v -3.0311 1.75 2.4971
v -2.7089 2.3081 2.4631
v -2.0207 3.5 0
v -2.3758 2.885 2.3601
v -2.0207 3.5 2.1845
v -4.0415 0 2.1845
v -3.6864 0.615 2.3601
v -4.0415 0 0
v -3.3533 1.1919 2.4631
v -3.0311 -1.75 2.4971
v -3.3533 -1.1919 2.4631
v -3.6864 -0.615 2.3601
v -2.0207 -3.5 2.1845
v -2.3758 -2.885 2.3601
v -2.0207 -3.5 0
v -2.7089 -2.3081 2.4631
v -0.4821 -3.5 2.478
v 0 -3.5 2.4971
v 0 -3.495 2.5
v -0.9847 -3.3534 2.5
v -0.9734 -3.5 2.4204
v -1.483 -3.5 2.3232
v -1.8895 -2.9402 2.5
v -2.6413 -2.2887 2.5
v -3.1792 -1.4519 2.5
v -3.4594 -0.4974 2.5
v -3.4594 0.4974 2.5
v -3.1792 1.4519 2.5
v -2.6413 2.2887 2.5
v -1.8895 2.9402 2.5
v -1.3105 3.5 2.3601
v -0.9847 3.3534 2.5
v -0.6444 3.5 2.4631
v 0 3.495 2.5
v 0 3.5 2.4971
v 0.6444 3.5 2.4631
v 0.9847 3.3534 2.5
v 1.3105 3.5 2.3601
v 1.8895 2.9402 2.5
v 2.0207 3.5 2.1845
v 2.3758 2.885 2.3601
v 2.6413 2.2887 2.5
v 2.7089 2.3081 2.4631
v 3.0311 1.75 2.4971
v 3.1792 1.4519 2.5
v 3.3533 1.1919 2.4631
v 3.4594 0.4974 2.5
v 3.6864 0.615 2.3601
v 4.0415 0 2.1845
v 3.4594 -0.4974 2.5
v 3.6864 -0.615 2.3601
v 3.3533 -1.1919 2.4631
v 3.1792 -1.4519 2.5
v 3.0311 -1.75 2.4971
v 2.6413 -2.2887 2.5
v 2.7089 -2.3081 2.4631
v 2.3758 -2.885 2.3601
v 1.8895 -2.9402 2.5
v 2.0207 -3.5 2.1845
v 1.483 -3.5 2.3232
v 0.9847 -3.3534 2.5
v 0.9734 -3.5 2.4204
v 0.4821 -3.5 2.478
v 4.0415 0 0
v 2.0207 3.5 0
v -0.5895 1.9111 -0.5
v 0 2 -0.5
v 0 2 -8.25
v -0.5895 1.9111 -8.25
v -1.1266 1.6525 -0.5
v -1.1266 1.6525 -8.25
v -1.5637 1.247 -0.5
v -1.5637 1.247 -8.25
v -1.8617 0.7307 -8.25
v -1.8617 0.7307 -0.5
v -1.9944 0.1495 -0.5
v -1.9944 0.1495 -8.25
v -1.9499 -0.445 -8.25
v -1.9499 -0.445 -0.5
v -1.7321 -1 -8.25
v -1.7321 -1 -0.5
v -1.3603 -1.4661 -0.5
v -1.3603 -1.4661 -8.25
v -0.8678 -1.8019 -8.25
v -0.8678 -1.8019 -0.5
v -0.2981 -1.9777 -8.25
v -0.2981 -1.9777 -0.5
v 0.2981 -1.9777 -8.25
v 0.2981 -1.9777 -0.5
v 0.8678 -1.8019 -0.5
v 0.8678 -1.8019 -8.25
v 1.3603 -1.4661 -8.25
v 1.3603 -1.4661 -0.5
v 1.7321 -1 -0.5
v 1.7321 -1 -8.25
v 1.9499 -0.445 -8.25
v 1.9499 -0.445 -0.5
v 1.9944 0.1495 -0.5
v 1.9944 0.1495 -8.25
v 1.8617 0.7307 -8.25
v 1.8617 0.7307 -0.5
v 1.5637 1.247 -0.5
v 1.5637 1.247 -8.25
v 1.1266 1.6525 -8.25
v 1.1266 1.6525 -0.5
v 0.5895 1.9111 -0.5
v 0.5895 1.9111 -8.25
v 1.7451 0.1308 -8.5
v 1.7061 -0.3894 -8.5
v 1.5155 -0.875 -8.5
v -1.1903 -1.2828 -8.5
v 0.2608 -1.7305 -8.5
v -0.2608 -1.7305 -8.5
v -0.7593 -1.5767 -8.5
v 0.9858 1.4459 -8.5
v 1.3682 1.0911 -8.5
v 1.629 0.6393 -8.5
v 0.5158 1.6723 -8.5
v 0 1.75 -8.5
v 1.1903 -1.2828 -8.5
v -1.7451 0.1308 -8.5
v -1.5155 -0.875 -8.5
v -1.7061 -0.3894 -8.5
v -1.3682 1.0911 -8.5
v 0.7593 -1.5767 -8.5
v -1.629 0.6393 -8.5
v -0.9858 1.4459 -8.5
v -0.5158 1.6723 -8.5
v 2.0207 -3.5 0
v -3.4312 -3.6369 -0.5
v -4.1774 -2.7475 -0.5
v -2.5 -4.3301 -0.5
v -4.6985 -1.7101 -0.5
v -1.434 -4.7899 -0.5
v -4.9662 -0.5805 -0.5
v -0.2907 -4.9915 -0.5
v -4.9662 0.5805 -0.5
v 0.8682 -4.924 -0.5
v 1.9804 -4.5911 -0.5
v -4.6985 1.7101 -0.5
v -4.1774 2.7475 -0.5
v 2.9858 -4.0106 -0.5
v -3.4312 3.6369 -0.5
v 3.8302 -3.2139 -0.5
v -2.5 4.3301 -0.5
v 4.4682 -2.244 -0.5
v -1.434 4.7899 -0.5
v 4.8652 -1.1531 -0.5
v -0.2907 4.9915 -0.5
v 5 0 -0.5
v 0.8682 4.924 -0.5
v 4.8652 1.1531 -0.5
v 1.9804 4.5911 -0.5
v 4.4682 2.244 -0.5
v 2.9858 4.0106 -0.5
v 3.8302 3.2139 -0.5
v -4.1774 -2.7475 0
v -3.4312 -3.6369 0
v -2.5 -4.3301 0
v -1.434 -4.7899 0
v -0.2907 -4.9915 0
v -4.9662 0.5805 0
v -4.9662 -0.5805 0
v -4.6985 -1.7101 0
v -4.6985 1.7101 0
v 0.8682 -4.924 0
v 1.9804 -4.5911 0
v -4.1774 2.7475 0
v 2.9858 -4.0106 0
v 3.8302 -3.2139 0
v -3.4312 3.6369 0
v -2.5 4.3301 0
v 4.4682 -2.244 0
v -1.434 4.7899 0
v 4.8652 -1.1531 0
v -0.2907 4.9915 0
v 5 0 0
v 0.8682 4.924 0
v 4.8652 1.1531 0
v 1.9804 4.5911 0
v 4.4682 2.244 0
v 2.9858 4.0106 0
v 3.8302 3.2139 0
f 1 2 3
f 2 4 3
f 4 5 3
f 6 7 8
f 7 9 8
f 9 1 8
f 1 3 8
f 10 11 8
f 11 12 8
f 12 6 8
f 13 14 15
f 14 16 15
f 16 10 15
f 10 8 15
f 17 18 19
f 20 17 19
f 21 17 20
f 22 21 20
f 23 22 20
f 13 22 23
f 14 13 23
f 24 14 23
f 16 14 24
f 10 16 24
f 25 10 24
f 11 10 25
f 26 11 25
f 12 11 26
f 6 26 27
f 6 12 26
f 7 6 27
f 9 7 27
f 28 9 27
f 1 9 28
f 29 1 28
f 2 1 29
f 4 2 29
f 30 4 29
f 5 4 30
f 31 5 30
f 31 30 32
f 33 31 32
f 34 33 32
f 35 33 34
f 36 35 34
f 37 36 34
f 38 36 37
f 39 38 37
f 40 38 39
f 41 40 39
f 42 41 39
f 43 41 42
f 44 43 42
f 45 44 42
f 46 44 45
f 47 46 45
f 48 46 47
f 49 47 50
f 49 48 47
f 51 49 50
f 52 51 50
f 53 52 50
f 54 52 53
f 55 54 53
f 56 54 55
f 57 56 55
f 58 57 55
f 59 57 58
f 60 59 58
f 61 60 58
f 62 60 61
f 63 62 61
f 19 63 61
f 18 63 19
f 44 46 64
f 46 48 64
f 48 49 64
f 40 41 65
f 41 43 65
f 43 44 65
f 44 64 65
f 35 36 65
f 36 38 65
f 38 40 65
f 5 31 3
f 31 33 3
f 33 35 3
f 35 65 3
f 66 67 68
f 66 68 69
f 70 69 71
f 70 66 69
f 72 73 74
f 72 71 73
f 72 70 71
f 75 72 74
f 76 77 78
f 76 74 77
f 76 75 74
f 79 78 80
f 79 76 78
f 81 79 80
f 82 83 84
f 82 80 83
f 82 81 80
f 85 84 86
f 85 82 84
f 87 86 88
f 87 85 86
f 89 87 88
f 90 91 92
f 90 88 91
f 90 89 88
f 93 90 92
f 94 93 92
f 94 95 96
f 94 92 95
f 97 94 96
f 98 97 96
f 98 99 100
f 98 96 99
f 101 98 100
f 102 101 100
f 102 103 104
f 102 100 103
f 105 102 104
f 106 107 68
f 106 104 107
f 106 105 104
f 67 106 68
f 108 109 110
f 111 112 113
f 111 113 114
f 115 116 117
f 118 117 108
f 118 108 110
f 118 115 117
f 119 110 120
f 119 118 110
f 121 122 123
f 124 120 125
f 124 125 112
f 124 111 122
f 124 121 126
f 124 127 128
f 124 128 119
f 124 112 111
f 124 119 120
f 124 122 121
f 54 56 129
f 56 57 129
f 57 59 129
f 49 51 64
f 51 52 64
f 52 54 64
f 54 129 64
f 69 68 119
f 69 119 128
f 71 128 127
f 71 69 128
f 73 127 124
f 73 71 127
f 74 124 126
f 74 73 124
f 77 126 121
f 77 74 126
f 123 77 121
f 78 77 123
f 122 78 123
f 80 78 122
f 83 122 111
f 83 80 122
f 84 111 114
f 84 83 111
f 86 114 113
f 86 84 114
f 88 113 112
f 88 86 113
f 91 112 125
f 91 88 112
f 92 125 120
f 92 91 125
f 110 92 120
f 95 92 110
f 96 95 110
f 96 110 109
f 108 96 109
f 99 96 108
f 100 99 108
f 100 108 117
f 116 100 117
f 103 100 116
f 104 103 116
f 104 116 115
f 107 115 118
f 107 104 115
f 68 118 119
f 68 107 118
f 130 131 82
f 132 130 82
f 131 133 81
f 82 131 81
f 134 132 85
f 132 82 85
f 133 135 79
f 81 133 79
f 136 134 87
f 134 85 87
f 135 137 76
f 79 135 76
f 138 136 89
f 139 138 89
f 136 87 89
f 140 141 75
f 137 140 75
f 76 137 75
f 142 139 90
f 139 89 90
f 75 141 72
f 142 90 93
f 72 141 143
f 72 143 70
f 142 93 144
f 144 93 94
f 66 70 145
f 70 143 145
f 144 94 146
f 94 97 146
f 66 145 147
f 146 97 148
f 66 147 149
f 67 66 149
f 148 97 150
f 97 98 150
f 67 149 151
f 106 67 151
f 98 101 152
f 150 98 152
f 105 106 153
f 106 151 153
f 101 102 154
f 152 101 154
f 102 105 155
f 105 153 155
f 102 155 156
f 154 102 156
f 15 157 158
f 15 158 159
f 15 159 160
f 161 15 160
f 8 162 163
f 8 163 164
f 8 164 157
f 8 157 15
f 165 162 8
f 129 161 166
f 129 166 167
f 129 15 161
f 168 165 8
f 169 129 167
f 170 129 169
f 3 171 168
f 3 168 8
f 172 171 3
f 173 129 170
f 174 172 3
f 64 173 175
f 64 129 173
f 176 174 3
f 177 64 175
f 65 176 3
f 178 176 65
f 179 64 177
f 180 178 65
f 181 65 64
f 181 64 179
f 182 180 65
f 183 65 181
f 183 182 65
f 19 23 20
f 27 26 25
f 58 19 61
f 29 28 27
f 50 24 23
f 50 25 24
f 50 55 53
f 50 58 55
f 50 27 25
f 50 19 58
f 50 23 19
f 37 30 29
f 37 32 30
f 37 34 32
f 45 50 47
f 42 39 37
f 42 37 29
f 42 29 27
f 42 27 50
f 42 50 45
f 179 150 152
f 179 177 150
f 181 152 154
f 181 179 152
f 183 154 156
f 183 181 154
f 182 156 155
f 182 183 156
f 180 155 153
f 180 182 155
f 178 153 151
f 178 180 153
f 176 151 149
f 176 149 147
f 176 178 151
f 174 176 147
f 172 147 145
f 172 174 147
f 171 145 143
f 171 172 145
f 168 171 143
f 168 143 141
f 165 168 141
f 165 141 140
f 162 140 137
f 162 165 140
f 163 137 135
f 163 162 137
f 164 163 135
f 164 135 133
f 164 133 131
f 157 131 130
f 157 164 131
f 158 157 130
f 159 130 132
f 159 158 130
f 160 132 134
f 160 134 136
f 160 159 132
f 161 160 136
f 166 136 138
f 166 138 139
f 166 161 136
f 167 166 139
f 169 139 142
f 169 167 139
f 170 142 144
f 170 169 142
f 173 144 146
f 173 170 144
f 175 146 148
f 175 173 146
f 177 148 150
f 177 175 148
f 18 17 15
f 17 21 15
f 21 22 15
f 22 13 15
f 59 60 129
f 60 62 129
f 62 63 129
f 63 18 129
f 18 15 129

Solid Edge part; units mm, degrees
sketch "Sketch1" plane through (0, 0, 0) normal (0, 0, 1) x (1, 0, 0)
  circle A0 centre (0, 0) radius 5
  dimension "D1" = 10
extrude "Protrusion1" add sketch "Sketch1" against normal blind 0.5
sketch "Sketch2" plane through (0, 0, 0) normal (0, 0, 1) x (1, 0, 0)
  line L0 (2.0207, 3.5) -> (-2.0207, 3.5)
  line L1 (-2.0207, 3.5) -> (-4.0415, 0)
  line L2 (-4.0415, 0) -> (-2.0207, -3.5)
  line L3 (-2.0207, -3.5) -> (2.0207, -3.5)
  line L4 (2.0207, -3.5) -> (4.0415, 0)
  line L5 (4.0415, 0) -> (2.0207, 3.5)
  dimension "D1" = 3.5
  dimension "D2" = 7
extrude "Protrusion2" add sketch "Sketch2" along normal blind 2.5
sketch "Sketch3" plane through (0, 0, 0) normal (1, 0, 0) x (0, 1, 0)
  line L0 (-3.495, 2.5) -> (-6.9591, 0.5)
  dimension "D1" = 4
revolve "RevolvedCutout1" cut sketch "Sketch3" angle 360 about axis through (0, 0, 2.5) along (0, 0, -1) material side at (0, -5.2521, 1.5433)
sketch "Sketch4" plane through (0, 0, -0.5) normal (0, 0, -1) x (0, 1, 0)
  circle A0 centre (0, 0) radius 2
  dimension "D1" = 4
extrude "Protrusion3" add sketch "Sketch4" along normal blind 8
chamfer "Chamfer1" distance 0.25 angle 45 1 edges at (0, -2, -8.5)
properties part number "BOLT1" material "Steel"
